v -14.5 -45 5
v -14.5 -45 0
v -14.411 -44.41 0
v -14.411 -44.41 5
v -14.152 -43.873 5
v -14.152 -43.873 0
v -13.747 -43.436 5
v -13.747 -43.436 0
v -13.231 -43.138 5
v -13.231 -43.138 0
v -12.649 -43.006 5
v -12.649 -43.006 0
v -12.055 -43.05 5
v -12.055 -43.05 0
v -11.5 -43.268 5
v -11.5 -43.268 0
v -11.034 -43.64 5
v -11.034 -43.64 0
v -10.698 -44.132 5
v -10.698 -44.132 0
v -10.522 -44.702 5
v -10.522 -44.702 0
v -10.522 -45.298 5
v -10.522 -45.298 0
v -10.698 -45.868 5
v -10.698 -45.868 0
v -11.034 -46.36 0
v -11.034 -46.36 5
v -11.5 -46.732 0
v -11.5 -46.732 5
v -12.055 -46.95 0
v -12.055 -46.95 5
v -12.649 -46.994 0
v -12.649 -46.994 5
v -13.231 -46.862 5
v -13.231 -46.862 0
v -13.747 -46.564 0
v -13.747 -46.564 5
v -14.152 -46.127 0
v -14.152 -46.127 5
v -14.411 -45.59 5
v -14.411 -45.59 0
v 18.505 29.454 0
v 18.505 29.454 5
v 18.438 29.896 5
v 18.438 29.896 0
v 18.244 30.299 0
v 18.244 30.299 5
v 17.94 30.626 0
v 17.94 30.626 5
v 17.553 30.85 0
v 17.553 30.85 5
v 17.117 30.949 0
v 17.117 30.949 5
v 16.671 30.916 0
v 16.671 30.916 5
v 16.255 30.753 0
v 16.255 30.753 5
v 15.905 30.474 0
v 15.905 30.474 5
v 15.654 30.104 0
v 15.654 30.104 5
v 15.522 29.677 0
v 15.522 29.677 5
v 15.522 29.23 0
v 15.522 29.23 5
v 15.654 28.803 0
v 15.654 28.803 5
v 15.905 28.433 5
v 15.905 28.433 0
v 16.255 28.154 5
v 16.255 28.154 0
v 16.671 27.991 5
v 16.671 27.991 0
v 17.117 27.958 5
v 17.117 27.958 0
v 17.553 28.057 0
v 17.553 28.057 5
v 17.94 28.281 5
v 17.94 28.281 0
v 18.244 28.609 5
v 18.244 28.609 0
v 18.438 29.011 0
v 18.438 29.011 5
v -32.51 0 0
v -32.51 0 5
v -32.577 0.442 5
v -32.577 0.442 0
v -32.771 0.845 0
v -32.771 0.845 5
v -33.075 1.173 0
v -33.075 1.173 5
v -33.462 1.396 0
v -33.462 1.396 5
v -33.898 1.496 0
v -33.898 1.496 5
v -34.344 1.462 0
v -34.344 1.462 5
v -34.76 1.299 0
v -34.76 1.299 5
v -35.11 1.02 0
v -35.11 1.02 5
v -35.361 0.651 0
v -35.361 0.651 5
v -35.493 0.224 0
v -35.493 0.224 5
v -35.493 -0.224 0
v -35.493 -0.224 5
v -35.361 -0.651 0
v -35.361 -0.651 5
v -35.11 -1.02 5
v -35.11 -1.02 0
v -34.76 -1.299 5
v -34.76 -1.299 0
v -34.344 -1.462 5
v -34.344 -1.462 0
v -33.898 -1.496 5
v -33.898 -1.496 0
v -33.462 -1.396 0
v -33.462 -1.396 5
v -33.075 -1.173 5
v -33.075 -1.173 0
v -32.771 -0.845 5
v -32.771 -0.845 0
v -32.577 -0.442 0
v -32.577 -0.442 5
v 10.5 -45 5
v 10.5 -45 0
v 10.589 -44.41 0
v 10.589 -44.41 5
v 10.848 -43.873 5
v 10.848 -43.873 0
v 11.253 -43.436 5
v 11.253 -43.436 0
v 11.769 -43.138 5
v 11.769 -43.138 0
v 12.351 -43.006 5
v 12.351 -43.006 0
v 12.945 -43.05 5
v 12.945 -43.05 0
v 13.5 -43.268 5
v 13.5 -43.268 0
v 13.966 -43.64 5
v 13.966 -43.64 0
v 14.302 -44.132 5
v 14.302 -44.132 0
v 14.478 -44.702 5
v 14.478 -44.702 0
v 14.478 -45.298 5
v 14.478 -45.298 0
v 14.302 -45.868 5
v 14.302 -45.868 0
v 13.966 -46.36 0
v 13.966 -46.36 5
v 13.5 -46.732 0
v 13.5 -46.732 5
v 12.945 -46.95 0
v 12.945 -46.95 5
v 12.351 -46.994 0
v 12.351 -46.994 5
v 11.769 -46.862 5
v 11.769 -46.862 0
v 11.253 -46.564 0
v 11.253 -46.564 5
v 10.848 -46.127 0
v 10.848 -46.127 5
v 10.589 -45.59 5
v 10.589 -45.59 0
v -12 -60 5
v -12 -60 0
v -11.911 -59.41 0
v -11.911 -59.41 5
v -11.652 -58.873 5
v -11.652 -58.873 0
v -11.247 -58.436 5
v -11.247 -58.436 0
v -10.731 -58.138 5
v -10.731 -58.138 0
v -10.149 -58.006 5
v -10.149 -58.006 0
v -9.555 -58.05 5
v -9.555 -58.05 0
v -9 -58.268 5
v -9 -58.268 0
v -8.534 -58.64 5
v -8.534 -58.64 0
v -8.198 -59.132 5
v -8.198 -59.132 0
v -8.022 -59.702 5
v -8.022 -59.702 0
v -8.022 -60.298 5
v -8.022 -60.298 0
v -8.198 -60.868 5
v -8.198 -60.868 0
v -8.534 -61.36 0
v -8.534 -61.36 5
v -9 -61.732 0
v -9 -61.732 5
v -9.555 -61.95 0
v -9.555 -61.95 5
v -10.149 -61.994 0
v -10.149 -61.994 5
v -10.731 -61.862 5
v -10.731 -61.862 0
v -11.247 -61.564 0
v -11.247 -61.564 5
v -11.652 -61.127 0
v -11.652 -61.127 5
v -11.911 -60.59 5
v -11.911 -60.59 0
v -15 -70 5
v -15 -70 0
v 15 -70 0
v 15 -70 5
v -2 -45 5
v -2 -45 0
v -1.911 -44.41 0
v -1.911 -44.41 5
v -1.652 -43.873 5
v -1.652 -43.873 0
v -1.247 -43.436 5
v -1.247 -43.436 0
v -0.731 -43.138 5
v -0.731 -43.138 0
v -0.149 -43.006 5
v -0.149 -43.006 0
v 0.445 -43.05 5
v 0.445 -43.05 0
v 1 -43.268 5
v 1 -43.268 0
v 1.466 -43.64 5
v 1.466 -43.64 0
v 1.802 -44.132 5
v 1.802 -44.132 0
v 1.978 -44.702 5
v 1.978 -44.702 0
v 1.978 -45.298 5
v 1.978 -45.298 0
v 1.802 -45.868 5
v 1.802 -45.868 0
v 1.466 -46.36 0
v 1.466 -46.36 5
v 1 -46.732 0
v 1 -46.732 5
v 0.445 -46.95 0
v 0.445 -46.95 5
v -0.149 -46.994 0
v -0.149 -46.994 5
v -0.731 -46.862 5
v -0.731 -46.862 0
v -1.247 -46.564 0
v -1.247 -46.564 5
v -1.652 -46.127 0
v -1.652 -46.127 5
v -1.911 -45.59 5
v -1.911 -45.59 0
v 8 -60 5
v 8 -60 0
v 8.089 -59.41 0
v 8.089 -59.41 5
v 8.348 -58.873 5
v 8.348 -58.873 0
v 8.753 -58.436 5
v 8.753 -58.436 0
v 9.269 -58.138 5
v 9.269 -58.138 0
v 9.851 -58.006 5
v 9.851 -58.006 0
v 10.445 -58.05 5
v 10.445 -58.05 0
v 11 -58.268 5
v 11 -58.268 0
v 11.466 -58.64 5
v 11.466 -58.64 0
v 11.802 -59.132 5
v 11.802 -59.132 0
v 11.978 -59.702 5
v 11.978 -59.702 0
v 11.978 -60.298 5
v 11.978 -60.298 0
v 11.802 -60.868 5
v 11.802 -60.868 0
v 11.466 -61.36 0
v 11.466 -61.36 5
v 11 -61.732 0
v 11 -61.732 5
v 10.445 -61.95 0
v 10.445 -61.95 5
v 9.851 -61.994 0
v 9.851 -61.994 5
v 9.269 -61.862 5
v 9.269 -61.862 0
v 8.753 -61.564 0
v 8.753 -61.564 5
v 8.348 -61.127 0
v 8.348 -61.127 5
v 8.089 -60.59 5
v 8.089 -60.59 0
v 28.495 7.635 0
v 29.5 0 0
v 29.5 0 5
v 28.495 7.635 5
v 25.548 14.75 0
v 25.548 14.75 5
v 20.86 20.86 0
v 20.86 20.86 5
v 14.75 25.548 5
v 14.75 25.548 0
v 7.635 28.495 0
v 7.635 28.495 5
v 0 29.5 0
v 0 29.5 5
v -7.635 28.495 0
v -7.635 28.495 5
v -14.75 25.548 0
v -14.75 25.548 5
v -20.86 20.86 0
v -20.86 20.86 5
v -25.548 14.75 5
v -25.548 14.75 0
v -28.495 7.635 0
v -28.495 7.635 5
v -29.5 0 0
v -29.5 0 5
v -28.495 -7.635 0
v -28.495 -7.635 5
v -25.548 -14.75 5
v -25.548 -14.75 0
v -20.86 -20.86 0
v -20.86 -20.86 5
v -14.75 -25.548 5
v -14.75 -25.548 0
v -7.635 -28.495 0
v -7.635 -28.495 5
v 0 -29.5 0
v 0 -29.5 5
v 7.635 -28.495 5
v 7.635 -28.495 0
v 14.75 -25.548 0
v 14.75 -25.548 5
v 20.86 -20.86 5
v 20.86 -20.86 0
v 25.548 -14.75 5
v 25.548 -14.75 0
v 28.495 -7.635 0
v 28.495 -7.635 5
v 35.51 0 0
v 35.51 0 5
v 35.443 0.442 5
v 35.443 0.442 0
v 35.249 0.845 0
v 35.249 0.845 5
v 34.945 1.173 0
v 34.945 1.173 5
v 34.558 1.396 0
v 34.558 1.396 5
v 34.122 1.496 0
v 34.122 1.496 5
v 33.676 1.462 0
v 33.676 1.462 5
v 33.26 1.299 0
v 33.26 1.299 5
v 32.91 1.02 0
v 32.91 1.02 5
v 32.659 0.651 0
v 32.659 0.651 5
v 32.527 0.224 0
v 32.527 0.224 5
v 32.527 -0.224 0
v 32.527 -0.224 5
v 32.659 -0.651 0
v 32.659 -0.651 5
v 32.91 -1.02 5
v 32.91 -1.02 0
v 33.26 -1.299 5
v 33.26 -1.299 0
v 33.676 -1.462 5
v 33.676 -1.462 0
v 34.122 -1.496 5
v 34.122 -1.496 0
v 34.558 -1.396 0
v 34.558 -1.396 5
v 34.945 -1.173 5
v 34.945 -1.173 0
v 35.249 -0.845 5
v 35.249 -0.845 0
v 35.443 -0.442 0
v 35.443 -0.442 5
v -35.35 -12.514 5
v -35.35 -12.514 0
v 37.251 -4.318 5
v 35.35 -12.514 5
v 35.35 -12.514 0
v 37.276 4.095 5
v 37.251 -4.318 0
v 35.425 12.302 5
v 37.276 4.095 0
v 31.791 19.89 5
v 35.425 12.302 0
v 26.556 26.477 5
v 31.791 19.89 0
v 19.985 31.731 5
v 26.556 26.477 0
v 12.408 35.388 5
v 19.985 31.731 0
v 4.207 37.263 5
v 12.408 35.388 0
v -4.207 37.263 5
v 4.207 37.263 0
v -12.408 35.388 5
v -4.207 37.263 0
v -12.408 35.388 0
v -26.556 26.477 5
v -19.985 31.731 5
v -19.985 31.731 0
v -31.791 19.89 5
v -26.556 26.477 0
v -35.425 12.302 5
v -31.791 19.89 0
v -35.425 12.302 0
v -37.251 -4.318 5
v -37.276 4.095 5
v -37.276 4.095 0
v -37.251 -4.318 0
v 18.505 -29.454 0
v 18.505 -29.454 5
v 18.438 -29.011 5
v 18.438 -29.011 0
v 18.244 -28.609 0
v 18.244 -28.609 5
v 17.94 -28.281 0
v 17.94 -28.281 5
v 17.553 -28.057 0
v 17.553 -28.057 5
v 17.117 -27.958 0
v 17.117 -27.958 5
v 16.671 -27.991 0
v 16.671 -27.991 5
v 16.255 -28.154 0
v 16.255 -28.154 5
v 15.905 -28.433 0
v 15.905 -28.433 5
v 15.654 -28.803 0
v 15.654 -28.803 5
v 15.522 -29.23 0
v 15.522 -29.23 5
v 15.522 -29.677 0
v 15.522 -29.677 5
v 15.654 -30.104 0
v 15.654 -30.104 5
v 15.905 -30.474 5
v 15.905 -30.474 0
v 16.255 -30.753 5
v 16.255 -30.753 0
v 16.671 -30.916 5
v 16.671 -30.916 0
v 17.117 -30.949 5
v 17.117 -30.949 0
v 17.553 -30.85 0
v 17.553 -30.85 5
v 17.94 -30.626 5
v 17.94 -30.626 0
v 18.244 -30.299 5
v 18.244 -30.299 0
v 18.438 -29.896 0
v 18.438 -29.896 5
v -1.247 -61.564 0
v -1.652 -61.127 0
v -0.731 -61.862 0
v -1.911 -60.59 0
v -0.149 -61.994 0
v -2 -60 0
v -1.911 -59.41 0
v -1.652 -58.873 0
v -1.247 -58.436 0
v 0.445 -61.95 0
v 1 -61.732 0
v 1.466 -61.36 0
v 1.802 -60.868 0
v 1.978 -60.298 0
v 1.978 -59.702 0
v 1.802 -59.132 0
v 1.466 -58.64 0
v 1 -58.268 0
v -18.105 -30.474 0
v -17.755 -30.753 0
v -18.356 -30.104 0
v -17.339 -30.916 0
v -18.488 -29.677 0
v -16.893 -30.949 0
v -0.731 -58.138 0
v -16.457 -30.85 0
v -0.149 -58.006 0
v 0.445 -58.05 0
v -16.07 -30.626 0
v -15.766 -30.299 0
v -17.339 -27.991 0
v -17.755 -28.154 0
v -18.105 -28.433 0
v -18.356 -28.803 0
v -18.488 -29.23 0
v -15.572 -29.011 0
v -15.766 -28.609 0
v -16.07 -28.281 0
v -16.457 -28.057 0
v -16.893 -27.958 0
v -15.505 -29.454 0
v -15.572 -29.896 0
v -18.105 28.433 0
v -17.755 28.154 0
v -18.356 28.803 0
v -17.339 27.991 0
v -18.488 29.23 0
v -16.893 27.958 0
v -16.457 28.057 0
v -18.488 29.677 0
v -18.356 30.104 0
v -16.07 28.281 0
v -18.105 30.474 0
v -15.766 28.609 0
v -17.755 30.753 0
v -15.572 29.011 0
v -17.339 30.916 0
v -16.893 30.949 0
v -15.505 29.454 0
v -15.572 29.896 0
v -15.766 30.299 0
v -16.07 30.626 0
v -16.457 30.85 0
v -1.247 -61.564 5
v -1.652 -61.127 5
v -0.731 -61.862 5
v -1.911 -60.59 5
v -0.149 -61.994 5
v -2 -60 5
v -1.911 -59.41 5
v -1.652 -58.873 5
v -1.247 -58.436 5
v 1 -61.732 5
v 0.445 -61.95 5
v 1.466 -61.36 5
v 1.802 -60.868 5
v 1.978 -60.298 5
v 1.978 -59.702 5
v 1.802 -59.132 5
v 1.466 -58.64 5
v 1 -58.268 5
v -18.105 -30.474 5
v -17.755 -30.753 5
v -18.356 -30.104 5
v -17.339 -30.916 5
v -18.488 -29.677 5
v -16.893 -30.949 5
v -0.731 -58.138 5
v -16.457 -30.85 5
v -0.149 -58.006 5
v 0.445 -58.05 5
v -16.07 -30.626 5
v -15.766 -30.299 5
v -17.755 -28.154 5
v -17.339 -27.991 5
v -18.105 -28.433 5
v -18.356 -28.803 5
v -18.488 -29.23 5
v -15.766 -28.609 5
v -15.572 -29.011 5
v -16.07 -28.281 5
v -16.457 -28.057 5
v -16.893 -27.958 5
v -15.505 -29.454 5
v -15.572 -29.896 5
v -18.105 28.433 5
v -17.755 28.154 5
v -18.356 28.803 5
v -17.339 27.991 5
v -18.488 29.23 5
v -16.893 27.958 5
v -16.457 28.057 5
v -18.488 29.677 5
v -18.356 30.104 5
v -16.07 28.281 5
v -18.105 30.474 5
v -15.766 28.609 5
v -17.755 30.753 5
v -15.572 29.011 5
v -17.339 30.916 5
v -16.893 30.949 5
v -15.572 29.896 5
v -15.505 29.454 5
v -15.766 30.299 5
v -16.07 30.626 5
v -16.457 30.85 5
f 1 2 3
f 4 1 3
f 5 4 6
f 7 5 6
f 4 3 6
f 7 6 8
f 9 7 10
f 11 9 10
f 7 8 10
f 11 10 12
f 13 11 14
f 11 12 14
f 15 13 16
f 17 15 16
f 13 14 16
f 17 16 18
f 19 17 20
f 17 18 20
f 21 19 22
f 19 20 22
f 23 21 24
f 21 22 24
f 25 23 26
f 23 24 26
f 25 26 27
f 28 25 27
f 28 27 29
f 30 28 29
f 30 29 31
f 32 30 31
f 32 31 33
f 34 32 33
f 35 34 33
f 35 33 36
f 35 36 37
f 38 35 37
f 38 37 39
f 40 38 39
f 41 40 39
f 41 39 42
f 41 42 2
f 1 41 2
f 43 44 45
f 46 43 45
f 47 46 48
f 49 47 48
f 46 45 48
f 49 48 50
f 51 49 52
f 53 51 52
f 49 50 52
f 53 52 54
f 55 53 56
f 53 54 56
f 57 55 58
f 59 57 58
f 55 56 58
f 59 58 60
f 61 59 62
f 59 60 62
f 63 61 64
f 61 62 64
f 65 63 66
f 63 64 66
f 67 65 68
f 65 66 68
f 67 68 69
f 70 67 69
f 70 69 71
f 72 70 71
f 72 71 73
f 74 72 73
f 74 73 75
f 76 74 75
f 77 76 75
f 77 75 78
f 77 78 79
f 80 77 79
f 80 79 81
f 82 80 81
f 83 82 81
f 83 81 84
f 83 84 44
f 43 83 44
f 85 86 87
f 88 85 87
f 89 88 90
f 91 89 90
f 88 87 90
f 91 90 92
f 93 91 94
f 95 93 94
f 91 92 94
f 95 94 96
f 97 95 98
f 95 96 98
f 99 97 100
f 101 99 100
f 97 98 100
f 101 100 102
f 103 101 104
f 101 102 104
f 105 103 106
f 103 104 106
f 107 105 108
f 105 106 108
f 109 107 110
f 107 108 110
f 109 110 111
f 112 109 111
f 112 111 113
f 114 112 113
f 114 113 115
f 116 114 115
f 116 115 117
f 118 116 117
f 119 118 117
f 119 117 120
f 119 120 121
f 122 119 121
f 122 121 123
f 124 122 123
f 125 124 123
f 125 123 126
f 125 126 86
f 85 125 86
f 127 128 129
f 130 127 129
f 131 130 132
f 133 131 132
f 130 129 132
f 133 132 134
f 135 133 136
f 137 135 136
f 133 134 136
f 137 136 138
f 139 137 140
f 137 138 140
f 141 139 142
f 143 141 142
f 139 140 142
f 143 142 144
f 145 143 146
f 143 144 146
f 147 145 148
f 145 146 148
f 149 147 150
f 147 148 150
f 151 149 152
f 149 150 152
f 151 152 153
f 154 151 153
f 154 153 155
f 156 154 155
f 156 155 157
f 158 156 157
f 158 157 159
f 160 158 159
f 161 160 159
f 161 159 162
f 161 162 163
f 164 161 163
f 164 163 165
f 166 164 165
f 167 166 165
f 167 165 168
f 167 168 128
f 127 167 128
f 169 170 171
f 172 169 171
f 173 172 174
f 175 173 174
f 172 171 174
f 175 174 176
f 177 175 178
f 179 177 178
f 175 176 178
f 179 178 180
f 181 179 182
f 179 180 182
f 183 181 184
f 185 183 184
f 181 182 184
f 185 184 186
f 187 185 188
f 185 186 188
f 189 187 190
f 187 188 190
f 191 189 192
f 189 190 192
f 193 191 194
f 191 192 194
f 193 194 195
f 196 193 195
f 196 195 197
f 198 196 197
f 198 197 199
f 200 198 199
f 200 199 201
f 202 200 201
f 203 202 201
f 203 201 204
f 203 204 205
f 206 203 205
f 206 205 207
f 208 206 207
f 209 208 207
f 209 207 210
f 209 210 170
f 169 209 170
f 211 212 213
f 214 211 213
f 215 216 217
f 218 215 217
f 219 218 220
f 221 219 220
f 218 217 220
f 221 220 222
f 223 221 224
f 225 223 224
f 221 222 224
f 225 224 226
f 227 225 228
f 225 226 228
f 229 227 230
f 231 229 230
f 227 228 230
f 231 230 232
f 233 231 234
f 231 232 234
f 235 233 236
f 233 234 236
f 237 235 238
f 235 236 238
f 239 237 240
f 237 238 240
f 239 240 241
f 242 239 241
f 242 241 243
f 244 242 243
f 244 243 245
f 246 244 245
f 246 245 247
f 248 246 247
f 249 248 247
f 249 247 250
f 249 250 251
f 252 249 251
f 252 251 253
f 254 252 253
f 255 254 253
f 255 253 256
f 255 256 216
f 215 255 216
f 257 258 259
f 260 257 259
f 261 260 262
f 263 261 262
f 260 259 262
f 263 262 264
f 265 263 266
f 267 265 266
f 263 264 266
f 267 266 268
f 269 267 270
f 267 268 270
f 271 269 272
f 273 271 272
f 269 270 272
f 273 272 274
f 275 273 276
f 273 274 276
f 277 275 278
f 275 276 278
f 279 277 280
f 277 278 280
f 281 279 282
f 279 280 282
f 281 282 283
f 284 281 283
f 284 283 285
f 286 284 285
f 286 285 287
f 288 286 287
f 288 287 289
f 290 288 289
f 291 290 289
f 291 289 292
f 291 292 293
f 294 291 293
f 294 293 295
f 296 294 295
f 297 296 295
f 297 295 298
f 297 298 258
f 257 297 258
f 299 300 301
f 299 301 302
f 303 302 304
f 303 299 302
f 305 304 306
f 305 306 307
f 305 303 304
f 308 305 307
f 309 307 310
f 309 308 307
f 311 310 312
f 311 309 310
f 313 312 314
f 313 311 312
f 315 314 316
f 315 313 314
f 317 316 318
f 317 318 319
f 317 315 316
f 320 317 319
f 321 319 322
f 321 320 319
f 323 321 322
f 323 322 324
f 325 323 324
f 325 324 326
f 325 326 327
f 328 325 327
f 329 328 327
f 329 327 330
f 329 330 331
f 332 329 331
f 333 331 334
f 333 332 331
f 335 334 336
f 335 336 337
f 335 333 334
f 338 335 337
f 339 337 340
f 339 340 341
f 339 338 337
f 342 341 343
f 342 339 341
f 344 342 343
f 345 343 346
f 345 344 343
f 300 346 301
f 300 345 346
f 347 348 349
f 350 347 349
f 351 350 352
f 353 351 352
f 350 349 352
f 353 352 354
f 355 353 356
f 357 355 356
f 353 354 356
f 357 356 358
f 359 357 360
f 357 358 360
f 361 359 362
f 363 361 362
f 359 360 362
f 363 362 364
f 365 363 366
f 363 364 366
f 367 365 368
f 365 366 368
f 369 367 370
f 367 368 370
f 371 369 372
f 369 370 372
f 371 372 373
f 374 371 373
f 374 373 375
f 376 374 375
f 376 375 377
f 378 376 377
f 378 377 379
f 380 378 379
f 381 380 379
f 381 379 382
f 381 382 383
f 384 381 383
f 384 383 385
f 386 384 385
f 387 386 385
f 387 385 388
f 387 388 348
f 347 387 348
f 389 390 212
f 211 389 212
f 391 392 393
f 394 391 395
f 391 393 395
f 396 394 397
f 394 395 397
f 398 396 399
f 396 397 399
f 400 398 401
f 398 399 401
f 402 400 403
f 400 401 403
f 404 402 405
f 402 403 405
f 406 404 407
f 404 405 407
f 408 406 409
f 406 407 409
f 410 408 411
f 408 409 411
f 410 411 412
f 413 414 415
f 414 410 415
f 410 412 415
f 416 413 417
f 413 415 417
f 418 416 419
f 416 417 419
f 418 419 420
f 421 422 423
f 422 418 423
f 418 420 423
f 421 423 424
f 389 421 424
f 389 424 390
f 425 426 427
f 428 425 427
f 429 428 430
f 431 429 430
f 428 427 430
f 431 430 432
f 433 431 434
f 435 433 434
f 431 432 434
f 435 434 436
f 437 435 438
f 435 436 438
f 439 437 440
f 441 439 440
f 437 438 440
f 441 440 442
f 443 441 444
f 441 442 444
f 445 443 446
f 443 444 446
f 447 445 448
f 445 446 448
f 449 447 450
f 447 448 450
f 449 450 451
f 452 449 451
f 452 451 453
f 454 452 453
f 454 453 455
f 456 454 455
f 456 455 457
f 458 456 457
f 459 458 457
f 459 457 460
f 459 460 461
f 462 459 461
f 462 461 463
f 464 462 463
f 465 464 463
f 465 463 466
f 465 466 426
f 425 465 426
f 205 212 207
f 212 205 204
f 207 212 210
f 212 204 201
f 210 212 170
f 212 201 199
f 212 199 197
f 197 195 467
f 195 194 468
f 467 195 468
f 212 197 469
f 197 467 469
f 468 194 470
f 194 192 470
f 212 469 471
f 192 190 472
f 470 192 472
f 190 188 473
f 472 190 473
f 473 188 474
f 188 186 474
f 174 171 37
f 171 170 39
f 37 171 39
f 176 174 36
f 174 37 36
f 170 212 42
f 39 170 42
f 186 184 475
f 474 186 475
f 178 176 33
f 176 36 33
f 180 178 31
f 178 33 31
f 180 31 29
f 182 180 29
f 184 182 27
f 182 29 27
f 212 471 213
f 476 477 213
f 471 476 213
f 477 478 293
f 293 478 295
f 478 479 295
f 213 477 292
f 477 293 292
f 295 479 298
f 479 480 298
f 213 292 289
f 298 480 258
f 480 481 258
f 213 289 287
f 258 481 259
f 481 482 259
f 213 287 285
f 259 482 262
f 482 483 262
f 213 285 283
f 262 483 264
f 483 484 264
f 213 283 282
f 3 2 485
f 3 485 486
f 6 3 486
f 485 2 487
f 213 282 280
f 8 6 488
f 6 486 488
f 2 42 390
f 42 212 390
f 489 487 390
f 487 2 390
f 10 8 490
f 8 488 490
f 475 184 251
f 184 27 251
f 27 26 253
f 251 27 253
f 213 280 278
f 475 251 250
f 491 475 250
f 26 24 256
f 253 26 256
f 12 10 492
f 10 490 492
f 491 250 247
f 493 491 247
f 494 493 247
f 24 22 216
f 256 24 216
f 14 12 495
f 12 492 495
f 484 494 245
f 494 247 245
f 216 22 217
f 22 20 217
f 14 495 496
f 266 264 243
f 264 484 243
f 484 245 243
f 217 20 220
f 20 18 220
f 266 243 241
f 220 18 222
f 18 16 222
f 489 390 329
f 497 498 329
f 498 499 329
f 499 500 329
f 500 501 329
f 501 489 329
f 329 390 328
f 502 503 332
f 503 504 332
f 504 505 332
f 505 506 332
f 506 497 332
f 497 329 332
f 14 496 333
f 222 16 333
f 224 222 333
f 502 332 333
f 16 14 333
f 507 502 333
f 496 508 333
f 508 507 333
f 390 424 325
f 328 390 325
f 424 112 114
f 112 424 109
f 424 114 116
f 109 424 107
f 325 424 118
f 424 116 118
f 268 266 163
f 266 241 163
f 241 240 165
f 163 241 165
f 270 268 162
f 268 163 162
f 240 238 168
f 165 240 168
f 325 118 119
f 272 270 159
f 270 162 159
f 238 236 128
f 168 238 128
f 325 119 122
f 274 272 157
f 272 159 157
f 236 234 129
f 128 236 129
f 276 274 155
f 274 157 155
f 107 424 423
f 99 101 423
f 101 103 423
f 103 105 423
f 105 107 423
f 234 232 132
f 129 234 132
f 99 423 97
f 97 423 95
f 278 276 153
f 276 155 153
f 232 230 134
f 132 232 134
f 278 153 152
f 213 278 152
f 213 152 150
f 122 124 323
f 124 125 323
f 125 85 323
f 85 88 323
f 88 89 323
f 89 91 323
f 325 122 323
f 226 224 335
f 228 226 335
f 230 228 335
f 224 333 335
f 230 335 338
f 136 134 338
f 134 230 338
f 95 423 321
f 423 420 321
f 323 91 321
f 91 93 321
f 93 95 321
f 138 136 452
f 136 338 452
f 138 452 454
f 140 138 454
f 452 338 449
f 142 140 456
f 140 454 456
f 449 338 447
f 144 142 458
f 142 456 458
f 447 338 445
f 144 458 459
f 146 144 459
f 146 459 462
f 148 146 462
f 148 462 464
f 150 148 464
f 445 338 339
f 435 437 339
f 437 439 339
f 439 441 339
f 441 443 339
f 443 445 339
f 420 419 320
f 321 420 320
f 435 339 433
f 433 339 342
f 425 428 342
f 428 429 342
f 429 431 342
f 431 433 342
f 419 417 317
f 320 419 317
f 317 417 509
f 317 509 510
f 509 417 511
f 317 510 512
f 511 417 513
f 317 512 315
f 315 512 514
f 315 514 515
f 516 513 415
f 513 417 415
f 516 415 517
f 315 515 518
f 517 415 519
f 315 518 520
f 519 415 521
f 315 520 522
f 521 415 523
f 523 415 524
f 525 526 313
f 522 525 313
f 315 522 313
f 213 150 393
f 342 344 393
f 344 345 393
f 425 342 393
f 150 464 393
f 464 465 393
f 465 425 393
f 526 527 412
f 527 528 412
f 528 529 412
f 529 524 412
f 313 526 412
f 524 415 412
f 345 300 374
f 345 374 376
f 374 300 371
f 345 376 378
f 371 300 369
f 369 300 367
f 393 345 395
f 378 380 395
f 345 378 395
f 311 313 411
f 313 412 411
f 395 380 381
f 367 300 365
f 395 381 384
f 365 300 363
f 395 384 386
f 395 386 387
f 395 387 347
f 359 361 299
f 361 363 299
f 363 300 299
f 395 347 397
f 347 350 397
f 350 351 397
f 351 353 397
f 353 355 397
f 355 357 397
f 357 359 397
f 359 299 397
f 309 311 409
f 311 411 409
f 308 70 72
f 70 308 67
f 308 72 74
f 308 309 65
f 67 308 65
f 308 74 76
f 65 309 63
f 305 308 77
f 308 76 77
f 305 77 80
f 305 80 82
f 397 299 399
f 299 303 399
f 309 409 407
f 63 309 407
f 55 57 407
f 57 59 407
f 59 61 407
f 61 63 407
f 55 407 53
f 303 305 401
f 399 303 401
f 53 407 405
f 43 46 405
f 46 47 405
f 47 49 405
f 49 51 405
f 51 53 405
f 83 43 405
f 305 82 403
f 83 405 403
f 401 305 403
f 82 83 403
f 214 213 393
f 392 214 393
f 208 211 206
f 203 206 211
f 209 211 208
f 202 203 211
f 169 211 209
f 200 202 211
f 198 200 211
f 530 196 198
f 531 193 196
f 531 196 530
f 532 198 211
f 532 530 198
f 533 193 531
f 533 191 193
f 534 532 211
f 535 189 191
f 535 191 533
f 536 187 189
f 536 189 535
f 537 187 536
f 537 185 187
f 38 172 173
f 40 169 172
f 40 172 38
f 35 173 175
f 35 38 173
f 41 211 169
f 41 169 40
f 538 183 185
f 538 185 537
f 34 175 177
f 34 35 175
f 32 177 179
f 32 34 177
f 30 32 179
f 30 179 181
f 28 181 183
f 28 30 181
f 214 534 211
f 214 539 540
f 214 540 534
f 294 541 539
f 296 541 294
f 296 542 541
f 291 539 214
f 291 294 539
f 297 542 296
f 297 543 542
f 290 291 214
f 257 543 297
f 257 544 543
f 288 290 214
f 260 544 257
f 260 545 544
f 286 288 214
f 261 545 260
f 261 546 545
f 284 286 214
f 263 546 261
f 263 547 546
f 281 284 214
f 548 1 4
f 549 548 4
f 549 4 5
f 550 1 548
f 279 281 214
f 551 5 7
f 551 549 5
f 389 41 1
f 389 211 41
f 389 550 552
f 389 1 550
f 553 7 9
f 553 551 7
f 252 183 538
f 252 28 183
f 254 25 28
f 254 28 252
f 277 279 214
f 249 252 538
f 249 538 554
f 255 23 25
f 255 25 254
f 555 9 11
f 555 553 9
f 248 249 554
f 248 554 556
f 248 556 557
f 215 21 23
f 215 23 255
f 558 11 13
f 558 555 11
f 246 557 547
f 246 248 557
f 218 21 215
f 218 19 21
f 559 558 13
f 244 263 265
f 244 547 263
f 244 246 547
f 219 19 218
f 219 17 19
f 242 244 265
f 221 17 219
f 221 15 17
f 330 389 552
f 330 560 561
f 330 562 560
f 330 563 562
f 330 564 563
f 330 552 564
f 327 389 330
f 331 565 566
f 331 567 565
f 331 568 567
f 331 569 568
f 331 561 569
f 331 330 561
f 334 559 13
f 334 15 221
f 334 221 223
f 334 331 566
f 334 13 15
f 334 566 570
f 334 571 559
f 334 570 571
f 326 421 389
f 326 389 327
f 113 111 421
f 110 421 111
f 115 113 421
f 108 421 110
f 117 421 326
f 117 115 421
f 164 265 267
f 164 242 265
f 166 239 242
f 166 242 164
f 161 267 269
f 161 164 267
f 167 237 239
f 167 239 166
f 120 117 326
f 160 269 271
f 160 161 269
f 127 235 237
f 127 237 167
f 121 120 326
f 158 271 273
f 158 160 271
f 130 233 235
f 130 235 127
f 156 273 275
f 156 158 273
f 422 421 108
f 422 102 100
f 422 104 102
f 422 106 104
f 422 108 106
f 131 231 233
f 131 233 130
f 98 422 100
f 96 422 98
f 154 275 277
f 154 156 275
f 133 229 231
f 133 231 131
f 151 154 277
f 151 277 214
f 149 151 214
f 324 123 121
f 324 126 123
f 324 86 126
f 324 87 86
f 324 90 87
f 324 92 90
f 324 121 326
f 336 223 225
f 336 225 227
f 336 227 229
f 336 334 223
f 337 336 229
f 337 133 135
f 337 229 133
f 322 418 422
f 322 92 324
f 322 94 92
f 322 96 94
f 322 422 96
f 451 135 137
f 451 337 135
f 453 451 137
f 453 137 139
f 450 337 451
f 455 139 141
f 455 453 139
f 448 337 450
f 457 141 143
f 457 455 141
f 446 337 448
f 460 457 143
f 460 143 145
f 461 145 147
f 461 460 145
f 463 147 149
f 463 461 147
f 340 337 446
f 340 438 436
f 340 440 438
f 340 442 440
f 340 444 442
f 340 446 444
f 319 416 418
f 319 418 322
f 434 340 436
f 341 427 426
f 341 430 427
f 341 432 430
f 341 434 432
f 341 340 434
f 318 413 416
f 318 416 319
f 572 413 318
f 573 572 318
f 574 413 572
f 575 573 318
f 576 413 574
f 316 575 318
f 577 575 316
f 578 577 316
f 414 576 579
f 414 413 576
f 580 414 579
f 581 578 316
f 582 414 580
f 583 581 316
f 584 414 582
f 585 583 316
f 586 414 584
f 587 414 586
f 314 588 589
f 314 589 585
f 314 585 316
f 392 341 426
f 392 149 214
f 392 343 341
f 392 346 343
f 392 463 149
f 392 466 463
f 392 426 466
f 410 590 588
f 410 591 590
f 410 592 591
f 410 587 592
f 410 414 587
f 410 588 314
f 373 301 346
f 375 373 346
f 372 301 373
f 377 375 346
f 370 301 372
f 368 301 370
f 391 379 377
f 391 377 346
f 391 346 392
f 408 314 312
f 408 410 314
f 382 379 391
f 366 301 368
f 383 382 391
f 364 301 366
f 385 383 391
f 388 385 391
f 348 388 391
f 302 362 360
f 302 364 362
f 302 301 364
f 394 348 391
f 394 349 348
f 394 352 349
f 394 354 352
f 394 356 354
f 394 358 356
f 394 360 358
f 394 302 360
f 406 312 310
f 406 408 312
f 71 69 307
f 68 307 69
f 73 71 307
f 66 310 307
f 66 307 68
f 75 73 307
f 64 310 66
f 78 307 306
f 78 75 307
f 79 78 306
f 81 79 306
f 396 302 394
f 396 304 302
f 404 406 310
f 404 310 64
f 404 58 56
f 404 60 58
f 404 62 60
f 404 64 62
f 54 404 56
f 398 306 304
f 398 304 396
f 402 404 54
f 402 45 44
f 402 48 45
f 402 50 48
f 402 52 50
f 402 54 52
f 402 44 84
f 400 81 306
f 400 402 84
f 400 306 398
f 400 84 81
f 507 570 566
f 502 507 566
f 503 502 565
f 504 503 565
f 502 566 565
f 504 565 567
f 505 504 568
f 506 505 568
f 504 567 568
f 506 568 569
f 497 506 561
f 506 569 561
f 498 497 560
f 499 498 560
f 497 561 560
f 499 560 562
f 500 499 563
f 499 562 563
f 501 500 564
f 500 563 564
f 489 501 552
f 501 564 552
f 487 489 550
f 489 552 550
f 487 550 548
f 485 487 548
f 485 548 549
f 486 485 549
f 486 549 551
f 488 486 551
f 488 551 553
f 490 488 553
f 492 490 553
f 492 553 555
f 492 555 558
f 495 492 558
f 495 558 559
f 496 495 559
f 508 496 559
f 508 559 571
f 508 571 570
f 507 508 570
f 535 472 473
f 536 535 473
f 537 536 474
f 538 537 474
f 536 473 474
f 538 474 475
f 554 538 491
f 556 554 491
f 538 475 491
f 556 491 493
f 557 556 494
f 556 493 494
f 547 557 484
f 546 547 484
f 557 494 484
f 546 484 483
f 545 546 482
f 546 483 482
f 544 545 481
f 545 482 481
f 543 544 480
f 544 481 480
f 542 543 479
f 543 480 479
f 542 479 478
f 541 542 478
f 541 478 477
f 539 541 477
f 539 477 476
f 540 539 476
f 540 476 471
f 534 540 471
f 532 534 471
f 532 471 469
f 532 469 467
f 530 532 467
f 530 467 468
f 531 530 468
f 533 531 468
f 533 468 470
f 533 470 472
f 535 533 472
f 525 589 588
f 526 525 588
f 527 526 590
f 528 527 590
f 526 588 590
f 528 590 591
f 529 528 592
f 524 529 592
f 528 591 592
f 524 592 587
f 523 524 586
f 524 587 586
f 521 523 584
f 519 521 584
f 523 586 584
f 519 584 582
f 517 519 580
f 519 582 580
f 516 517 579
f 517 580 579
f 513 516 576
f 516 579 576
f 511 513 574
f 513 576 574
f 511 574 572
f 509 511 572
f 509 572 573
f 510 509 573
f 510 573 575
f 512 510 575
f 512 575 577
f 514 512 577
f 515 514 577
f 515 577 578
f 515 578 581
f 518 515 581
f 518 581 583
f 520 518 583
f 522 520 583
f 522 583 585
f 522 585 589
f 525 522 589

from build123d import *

# Parameters (mm, degrees)
SKETCH1_R           = 37.5
SKETCH1_R_2         = 29.5
BOSS_EXTRUDE1_DEPTH = 5
SKETCH12_R          = 2
CUT_EXTRUDE8_DEPTH  = 7
SKETCH9_R           = 1.5
CUT_EXTRUDE5_DEPTH  = 7


with BuildPart() as part:
    # Sketch1 → Boss-Extrude1 (new body)
    # profile 1 of 2: a face of its own
    with BuildSketch(Plane.XY):
        Circle(SKETCH1_R)
        Circle(SKETCH1_R_2, mode=Mode.SUBTRACT)
    # profile 2 of 2: a face of its own
    with BuildSketch(Plane.XY):
        with BuildLine():
            Line((-15, -70), (15, -70))
            Line((15, -70), (35.350308448, -12.514219618))
            ThreePointArc((35.350308448, -12.514219618), (0, -37.5), (-35.350308448, -12.514219618))
            Line((-35.350308448, -12.514219618), (-15, -70))
        make_face()
    extrude(amount=BOSS_EXTRUDE1_DEPTH)

    # Sketch12 → Cut-Extrude8 (cut)
    with BuildSketch(Plane(origin=(0, 0, 0), x_dir=(-1, 0, 0), z_dir=(0, 0, -1))):
        with Locations((-12.5, -45)):
            Circle(SKETCH12_R)
        with Locations((12.5, -45)):
            Circle(SKETCH12_R)
        with Locations((-10, -60)):
            Circle(SKETCH12_R)
        with Locations((10, -60)):
            Circle(SKETCH12_R)
        with Locations((0, -45)):
            Circle(SKETCH12_R)
        with Locations((0, -60)):
            Circle(SKETCH12_R)
    extrude(amount=-CUT_EXTRUDE8_DEPTH, mode=Mode.SUBTRACT)

    # Sketch9 → Cut-Extrude5 (cut)
    with BuildSketch(Plane.XY.offset(5)):
        with Locations((17.005, 29.453523983)):
            Circle(SKETCH9_R)
        with Locations((34.01, 0)):
            Circle(SKETCH9_R)
        with Locations((17.005, -29.453523983)):
            Circle(SKETCH9_R)
        with Locations((-17.005, -29.453523983)):
            Circle(SKETCH9_R)
        with Locations((-34.01, 0)):
            Circle(SKETCH9_R)
        with Locations((-17.005, 29.453523983)):
            Circle(SKETCH9_R)
    extrude(amount=-CUT_EXTRUDE5_DEPTH, mode=Mode.SUBTRACT)


solid = part.part
